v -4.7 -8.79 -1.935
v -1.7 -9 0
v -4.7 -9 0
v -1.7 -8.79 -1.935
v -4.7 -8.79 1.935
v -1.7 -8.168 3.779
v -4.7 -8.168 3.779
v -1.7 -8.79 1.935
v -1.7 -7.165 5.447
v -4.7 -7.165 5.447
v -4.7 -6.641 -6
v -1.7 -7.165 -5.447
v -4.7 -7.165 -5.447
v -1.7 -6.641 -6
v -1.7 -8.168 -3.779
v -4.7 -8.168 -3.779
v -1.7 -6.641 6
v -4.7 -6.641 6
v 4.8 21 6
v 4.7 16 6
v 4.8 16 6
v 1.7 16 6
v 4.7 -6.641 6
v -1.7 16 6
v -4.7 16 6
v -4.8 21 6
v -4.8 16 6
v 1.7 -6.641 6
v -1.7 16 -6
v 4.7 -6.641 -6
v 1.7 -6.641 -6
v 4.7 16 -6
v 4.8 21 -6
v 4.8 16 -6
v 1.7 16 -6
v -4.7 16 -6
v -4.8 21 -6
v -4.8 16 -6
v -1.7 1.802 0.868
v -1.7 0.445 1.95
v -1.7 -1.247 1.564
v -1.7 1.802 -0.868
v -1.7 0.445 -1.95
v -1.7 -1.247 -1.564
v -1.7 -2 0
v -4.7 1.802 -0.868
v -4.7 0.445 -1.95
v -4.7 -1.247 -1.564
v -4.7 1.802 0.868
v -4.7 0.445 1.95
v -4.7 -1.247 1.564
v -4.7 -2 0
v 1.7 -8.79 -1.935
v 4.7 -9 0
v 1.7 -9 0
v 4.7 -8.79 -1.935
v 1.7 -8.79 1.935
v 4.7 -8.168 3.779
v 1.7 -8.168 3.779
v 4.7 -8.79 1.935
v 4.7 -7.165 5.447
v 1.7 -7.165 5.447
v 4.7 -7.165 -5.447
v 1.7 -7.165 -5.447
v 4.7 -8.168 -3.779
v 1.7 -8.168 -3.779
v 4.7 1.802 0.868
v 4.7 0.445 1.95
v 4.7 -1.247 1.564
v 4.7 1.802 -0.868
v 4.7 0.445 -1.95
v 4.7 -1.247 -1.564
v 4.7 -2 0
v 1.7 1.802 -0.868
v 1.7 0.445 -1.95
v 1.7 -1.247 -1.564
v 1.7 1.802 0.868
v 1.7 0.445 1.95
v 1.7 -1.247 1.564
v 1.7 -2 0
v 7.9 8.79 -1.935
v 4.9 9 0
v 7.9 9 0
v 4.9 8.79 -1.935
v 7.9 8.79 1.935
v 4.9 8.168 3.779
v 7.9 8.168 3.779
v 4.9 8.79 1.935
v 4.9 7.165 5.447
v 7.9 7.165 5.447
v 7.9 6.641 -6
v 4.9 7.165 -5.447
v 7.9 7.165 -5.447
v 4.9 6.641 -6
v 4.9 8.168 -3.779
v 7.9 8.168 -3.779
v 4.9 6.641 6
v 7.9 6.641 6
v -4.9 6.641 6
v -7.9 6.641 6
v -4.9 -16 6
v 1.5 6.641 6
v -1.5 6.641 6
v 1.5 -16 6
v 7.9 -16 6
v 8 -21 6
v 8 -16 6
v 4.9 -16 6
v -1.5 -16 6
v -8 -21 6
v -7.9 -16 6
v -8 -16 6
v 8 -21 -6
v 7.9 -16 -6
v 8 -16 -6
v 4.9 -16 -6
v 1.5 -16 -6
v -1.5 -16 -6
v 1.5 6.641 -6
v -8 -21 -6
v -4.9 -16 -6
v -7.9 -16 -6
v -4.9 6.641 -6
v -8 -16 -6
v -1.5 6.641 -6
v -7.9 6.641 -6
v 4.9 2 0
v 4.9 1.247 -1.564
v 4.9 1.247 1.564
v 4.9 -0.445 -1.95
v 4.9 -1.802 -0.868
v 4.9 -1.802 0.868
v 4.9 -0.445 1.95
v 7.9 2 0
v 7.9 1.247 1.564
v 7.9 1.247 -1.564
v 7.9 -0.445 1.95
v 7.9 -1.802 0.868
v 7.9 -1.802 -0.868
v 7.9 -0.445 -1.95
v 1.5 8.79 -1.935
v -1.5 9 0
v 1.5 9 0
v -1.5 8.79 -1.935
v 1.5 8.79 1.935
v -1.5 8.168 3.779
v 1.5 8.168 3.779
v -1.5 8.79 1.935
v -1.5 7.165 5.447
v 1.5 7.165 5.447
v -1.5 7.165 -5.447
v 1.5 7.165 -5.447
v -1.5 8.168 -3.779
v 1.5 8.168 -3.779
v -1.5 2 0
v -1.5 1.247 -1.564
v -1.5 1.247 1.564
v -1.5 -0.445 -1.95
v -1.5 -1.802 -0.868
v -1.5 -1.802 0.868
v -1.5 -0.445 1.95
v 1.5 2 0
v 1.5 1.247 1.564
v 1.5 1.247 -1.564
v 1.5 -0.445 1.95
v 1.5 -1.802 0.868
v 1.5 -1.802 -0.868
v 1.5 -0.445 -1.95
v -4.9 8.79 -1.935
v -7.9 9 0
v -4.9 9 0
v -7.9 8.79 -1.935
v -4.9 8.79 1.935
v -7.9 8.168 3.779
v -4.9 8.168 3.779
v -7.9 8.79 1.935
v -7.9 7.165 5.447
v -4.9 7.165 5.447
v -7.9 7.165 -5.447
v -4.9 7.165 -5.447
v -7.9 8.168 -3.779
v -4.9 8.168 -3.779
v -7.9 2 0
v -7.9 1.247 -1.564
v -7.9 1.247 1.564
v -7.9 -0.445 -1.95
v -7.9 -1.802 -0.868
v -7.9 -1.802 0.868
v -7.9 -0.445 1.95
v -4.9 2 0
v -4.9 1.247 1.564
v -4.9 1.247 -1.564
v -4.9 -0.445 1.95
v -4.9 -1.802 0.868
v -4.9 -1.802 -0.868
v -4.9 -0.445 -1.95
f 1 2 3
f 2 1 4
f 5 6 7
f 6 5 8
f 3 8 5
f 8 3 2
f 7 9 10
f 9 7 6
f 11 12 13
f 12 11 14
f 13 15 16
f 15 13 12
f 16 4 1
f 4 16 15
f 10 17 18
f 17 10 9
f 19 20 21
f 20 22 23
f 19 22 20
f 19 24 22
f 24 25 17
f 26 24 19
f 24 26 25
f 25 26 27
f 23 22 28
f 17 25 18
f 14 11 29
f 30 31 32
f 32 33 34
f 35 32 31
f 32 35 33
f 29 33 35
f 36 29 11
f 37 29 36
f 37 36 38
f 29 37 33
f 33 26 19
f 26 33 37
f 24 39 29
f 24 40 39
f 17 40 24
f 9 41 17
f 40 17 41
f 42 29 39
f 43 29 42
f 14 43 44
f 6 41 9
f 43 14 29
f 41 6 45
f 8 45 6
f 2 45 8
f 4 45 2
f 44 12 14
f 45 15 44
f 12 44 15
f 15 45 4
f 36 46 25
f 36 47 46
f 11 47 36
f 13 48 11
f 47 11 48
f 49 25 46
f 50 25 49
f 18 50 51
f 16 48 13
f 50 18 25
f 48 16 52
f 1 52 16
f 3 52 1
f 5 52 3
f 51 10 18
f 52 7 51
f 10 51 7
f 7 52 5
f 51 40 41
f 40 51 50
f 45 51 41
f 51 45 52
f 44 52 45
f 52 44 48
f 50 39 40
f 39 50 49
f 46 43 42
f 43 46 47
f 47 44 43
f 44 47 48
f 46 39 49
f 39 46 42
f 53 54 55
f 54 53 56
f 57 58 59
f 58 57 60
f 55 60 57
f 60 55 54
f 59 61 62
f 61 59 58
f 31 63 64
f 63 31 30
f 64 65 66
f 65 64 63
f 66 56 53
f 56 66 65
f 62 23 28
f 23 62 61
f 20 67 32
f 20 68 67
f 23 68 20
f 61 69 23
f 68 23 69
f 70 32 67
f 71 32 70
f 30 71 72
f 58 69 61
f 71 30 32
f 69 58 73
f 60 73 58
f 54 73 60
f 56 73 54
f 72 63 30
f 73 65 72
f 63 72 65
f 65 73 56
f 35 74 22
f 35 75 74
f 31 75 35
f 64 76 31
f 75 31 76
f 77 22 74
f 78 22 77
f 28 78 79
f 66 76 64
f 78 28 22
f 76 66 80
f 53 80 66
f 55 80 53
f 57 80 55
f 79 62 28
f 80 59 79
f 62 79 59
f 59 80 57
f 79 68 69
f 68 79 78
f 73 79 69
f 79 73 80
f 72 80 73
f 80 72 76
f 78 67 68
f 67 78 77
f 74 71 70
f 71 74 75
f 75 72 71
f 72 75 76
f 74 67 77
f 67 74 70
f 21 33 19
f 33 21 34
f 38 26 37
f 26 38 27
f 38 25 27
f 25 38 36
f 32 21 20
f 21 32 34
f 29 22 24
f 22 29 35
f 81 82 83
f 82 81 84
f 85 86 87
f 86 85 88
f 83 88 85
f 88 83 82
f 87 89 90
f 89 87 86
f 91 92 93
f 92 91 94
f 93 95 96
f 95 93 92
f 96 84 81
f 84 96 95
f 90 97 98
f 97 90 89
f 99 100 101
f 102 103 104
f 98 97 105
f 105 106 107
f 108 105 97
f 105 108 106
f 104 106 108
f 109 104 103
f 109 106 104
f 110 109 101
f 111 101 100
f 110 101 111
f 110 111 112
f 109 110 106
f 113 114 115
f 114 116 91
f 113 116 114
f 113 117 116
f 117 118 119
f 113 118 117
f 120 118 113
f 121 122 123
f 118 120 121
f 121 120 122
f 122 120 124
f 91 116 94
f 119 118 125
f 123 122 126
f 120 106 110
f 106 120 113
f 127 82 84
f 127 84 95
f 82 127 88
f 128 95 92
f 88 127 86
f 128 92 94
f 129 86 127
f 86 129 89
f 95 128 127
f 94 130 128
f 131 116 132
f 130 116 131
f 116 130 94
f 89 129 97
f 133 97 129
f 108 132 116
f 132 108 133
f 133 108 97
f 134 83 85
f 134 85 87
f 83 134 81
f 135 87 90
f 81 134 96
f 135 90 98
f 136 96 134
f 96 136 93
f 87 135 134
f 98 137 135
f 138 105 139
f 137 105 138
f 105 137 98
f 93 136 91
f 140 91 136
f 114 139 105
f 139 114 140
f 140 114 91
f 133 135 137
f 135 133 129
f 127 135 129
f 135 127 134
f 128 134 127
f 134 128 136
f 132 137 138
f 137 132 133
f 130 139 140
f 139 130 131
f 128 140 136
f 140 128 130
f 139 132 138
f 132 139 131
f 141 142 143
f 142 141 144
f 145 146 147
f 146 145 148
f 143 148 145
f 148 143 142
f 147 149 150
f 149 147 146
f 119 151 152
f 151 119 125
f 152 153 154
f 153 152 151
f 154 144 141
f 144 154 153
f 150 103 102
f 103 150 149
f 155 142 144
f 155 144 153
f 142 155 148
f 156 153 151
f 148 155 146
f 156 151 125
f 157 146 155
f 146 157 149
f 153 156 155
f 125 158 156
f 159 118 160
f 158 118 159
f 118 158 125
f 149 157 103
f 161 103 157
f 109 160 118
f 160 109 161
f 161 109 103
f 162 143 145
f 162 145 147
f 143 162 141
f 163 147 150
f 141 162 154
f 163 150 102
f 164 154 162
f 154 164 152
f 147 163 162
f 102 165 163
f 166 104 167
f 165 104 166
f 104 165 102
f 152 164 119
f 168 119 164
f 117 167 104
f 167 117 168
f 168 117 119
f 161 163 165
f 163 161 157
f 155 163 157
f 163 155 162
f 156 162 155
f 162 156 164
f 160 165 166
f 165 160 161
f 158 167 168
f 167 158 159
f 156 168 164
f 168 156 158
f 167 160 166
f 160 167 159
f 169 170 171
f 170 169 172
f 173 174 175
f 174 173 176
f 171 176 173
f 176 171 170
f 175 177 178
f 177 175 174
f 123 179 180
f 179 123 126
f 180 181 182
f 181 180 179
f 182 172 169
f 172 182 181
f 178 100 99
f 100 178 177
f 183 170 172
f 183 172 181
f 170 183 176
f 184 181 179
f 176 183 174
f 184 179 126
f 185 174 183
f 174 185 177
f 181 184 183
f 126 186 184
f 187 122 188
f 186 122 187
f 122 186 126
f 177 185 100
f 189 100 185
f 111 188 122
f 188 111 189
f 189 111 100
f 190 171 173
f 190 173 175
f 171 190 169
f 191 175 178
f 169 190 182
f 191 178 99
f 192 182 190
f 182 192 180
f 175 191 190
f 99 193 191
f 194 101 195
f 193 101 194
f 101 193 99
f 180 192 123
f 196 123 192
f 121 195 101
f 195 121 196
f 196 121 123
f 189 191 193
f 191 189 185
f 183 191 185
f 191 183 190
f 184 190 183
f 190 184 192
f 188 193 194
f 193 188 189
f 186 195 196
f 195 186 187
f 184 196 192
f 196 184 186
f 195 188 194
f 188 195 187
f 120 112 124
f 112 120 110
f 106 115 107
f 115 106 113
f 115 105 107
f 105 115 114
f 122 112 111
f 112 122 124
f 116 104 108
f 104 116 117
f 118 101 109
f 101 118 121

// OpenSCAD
// file: lib.scad
module hull_box(l,w,h,c, center=true)
{	
    translate([center ? 0 : l/2, center ? 0 : w/2, center ? 0 : h/2]) 
	hull() {
        translate([-l/2+c, -w/2+c, -h/2+c]) sphere(r=c);
        translate([ l/2-c, -w/2+c, -h/2+c]) sphere(r=c);
        translate([ l/2-c,  w/2-c, -h/2+c]) sphere(r=c);
        translate([-l/2+c,  w/2-c, -h/2+c]) sphere(r=c);
        translate([-l/2+c, -w/2+c,  h/2-c]) sphere(r=c);
        translate([ l/2-c, -w/2+c,  h/2-c]) sphere(r=c);
        translate([ l/2-c,  w/2-c,  h/2-c]) sphere(r=c);
        translate([-l/2+c,  w/2-c,  h/2-c]) sphere(r=c);
    }
}

module wedge(l,w,h1,h2) {
    hull() {
        translate([0,(l-h1)/2,0])
            rotate([0,90,0]) cylinder(d=h1, h=w, center=true);
        translate([0,-l*0.45,0])
            cube([w,l*0.1,h2], center=true);
    }
}

module hinge_unit(p,d,l,w,h) {
    difference() {
        intersection() {
            cube([l,w,h], center=true);
            union() {
                translate([p,0,0]) rotate([90,0,0]) cylinder(d=(l/2-p)*2,h=2*w, center=true);
                translate([-l/2,-w,-h/2]) cube([l/2+p,w*2,h]);
            }
        }
        translate([p,0,0]) rotate([90,0,0]) cylinder(d=d,h=2*w, center=true);
    }
}

module hinge_n(p,d,l,w,h,j=0.2, n=1, base_h=0) {
    translate([0,(l-base_h)/2,0])
        cube([(2*n-1)*(w+j),base_h,h], center=true);
	translate([-(n-1)*(w+j),0,0]) for (i = [0 : n-1] ) {
		translate([ 2*i*(w+j), 0, 0]) rotate([0,0,270]) hinge_unit(p,d,l,w,h);
	}
}

module hinge_lock(hd,hl,e,j=0.2, endlock=true) {
    cylinder(d=hd-j, h=hl, center=true);
    translate([-e,0,hl/2]) rotate([90,0,0]) rotate_extrude(angle=180)
       translate([e, 0, 0]) circle(d=hd-j);
    translate([-2*e,0,0]) rotate([0,0,0]) cylinder(d=hd-j, h=hl, center=true);
    translate([-e,0,-hl/2]) rotate([90,0,0]) rotate_extrude(angle=90)
       translate([-e, 0, 0]) circle(d=hd-j);
	if (endlock) {
		translate([-e/2,0,-hl/2-hd]) rotate([0,90,0]) cylinder(d=hd-j, h=hl/4, center=true);
	}
}

module grip(l, d, f=1.2, t=0.5, dg=0, dh=1, dfl=1, center=true) {
    difference() {
        hull() {
            cylinder(h=l, d=d*f, center=center);
            if (dg != 0) {
                translate([dg + (t>0 ? 1 : -1) * (center ? d/2 : 0), 0, 0])
#                    cylinder(h=l*dfl, d=dh, center=center);
            }
        }
        cylinder(h=l*1.1, d=d, center=center);
        translate([d*f*t, 0, 0])
            cube([d*f,d*f,l*1.1], center=center);
    }
}

module angle_hold(a,r,l,t,d, f=1.2, dt=0.67, fl=1, dg=0, dh=1, dfl=1) {
    difference() {
        rotate_extrude(angle=a)
            translate([r, 0, 0]) square([l,t], center=true);
        rotate([90,0,90-0.5])
            translate([0,0,r]) cylinder(h=l*f, d=d*f, center=true);
        rotate([90,0,90+a+0.5])
            translate([0,0,r]) cylinder(h=l*f, d=d*f, center=true);
    }
    rotate([90,0,90])
        translate([0,0,r*0.995]) grip(l=l*fl, d=d, f=f, t=-dt, dg=dg, dh=dh, dfl=dfl);
    rotate([90,0,90+a])
        translate([0,0,r*0.995]) grip(l=l*fl, d=d, f=f, t=dt, dg=-dg, dh=dh, dfl=dfl);
}

module tube_lock(hinge_p, hinge_d, hinge_l, hinge_w, hinge_h, grip_l, grip_d, n=1, flat=true, f_grip=1.2) {
    difference() {
        union() {
            grip(grip_l, grip_d, f_grip);
            translate([flat?-hinge_w/2:0,-(hinge_l+grip_d)/2,0]) 
                rotate([0, flat?0:90, 0])
                    hinge_n(hinge_p,hinge_d,hinge_l,hinge_w,hinge_h, n=n);
            translate([flat?-hinge_w/2:0,(hinge_l+grip_d)/2,0]) rotate([0,0,180])
                rotate([0, flat?0:90, 0])
                    hinge_n(hinge_p,hinge_d,hinge_l,hinge_w,hinge_h, n=n);
        }
        if(!flat) {
            translate([grip_d/2,0,0])
                cube([grip_d,grip_d*f_grip,grip_l], center=true);
        }
    }
}

module sphere_hold(d,e,j,d1,a1,d2,a2) {
    difference() {
        sphere(d=d+e);
        sphere(d=d+j);
        rotate([0,a1,0]) translate([d1,0,0])
#            cube([d+e+j,d+e+j,d+e+j], center=true);
        rotate([0,a2,0]) translate([d2,0,0])
#            cube([d+e+j,d+e+j,d+e+j], center=true);
    }
}

module sphere_magnet_hold(d,e,c,j,d1,a1,d2,a2) {
    difference() {
        sphere_hold(d,e,j,d1,a1,d2,a2);
        translate([-(d+c)/2,0,0])
#            cube([c+j,c+j,c+j], center=true);
    }
}

module sphere_hinge_hold(d,e,j,d1,a1,d2,a2,hp,hd,hl,hw,hh,hn=3,ah=0,av=0) {
	sphere_hold(d,e,j,d1,a1,d2,a2);
	rotate([0,ah,0]) 
		translate([-(d+hl)*0.49,0,0]) 
			rotate([0,av,-90])
				hinge_n(hp,hd,hl,hw,hh, n=hn, base_h=e*1.5);
}
// main file
include<lib.scad>

portee=6;
vis=4;
hinge_l=30;
hinge_w=3;
hinge_p=5;
hinge_h=12;
hinge_j=0.2;

translate([0, portee,0]) rotate([0,0,0])
  hinge_n(portee,vis,hinge_l,hinge_w,hinge_h,hinge_j,n=2,base_h=5);
translate([0,-portee,0]) rotate([0,0,180])
#  hinge_n(portee,vis,hinge_l,hinge_w,hinge_h,hinge_j,n=3,base_h=5);

translate([0,0,0])
rotate([0,90,0])
%  hinge_lock(vis, (hinge_w*5+hinge_j*4) * 1.5, vis, 0.5);
